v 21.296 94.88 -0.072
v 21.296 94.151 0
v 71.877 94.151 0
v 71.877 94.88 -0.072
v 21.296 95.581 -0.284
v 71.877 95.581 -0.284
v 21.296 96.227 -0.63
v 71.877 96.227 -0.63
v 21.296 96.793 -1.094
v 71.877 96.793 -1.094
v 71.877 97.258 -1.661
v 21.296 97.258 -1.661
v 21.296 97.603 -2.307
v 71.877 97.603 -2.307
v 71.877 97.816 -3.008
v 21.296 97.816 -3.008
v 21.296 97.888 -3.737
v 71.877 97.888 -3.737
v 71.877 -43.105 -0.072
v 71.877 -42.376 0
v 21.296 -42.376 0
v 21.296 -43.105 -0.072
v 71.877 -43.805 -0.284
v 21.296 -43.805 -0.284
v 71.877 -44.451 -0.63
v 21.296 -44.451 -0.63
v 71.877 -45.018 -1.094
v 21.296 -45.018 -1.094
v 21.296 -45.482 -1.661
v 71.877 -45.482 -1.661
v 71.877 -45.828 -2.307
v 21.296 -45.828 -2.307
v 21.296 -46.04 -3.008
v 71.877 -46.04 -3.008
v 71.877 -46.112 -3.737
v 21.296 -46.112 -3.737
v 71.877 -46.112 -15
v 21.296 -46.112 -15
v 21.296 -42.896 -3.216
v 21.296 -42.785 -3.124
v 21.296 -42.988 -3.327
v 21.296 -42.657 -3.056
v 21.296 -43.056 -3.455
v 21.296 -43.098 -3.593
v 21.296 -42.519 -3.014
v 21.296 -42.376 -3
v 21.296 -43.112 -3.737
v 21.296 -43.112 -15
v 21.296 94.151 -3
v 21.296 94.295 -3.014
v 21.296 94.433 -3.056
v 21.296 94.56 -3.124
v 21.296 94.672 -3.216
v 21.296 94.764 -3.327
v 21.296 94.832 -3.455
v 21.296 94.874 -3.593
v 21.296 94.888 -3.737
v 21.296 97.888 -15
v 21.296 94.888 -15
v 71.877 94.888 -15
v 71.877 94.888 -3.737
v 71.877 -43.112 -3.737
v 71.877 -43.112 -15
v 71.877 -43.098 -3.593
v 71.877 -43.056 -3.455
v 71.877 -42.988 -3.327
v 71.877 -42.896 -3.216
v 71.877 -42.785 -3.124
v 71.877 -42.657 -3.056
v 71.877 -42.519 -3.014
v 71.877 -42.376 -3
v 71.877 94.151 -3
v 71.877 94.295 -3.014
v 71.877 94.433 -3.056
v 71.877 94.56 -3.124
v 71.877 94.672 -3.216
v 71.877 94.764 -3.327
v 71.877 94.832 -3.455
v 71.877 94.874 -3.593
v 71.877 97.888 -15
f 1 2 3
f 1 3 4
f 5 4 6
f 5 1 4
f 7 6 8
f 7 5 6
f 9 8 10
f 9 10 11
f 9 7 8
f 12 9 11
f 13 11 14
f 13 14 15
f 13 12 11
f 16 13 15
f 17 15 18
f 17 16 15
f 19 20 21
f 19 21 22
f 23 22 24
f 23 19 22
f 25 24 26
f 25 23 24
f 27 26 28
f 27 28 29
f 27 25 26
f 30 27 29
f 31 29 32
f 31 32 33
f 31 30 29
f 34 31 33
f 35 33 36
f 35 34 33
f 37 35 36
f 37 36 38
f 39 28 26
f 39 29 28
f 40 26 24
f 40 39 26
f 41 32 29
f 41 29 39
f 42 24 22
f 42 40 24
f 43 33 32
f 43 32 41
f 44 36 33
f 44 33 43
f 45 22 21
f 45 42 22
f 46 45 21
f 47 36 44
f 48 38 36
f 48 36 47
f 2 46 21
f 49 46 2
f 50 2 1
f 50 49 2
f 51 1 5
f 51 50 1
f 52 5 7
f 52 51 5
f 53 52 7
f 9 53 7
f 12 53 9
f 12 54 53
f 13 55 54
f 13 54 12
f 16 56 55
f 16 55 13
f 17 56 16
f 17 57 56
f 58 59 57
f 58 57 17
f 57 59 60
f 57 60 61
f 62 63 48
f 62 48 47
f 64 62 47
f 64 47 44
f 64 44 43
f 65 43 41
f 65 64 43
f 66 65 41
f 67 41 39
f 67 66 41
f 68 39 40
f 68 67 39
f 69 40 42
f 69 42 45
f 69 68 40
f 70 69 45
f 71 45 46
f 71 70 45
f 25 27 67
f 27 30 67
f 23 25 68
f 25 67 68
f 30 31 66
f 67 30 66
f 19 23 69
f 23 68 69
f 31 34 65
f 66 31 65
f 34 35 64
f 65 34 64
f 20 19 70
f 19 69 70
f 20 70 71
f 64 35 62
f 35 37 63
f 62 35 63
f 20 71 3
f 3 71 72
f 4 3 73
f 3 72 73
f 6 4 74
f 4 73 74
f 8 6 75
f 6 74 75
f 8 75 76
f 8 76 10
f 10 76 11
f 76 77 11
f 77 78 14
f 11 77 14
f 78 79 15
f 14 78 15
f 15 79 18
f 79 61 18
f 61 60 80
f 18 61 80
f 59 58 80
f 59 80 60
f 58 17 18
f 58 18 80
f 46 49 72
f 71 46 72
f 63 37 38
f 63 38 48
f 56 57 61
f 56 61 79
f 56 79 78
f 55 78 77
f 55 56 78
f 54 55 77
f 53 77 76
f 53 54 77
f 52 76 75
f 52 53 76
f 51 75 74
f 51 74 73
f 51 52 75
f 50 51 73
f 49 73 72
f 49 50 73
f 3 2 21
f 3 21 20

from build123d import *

# Parameters (mm, degrees)
SKETCH1_W                    = 50.580870405
SKETCH1_H                    = 144
BASE_FLANGE1_DEPTH           = 3
EDGE_FLANGE1_STRIP_W         = 13.4732
EDGE_FLANGE1_STRIP_H         = 3
EDGE_FLANGE1_STRIP_CUT_DEPTH = 50.580870405
EDGE_FLANGE1_DEPTH           = 50.580870405
EDGE_FLANGE2_STRIP_W         = 13.4732
EDGE_FLANGE2_STRIP_H         = 3
EDGE_FLANGE2_STRIP_CUT_DEPTH = 50.580870405
EDGE_FLANGE2_DEPTH           = 50.580870405


# Sheet-metal steps are written as plain solids
with BuildPart() as part:
    # Sketch1 → Base-Flange1 (new body)
    with BuildSketch(Plane.XY):
        with Locations((46.586592155, 25.88784612)):
            Rectangle(SKETCH1_W, SKETCH1_H)
    extrude(amount=-BASE_FLANGE1_DEPTH)

    # Edge-Flange1 strip (across the edge) → Edge-Flange1 strip cut (cut)
    with BuildSketch(Plane(origin=(71.877027357, -46.11215388, -3), x_dir=(0, 1, 0), z_dir=(-1, 0, 0))):
        with Locations((-3, -1.5)):
            Rectangle(EDGE_FLANGE1_STRIP_W, EDGE_FLANGE1_STRIP_H)
    extrude(amount=EDGE_FLANGE1_STRIP_CUT_DEPTH, mode=Mode.SUBTRACT)

    # Edge-Flange1 section (across the edge) → Edge-Flange1 (add)
    with BuildSketch(Plane(origin=(71.877027357, -46.11215388, -3), x_dir=(0, 1, 0), z_dir=(-1, 0, 0))):
        with BuildLine():
            Line((0, 0.7366), (0, 12))
            Line((0, 12), (3, 12))
            Line((3, 12), (3, 0.7366))
            ThreePointArc((3, 0.7366), (3.215745145, 0.215745145), (3.7366, 0))
            Line((3.7366, 0), (3.7366, -3))
            ThreePointArc((3.7366, -3), (1.094424801, -1.905575199), (0, 0.7366))
        make_face()
    extrude(amount=EDGE_FLANGE1_DEPTH)

    # Edge-Flange2 strip (across the edge) → Edge-Flange2 strip cut (cut)
    with BuildSketch(Plane(origin=(21.296156952, 97.88784612, -3), x_dir=(0, -1, 0), z_dir=(1, 0, 0))):
        with Locations((-3, -1.5)):
            Rectangle(EDGE_FLANGE2_STRIP_W, EDGE_FLANGE2_STRIP_H)
    extrude(amount=EDGE_FLANGE2_STRIP_CUT_DEPTH, mode=Mode.SUBTRACT)

    # Edge-Flange2 section (across the edge) → Edge-Flange2 (add)
    with BuildSketch(Plane(origin=(21.296156952, 97.88784612, -3), x_dir=(0, -1, 0), z_dir=(1, 0, 0))):
        with BuildLine():
            Line((0, 0.7366), (0, 12))
            Line((0, 12), (3, 12))
            Line((3, 12), (3, 0.7366))
            ThreePointArc((3, 0.7366), (3.215745145, 0.215745145), (3.7366, 0))
            Line((3.7366, 0), (3.7366, -3))
            ThreePointArc((3.7366, -3), (1.094424801, -1.905575199), (0, 0.7366))
        make_face()
    extrude(amount=EDGE_FLANGE2_DEPTH)


solid = part.part
